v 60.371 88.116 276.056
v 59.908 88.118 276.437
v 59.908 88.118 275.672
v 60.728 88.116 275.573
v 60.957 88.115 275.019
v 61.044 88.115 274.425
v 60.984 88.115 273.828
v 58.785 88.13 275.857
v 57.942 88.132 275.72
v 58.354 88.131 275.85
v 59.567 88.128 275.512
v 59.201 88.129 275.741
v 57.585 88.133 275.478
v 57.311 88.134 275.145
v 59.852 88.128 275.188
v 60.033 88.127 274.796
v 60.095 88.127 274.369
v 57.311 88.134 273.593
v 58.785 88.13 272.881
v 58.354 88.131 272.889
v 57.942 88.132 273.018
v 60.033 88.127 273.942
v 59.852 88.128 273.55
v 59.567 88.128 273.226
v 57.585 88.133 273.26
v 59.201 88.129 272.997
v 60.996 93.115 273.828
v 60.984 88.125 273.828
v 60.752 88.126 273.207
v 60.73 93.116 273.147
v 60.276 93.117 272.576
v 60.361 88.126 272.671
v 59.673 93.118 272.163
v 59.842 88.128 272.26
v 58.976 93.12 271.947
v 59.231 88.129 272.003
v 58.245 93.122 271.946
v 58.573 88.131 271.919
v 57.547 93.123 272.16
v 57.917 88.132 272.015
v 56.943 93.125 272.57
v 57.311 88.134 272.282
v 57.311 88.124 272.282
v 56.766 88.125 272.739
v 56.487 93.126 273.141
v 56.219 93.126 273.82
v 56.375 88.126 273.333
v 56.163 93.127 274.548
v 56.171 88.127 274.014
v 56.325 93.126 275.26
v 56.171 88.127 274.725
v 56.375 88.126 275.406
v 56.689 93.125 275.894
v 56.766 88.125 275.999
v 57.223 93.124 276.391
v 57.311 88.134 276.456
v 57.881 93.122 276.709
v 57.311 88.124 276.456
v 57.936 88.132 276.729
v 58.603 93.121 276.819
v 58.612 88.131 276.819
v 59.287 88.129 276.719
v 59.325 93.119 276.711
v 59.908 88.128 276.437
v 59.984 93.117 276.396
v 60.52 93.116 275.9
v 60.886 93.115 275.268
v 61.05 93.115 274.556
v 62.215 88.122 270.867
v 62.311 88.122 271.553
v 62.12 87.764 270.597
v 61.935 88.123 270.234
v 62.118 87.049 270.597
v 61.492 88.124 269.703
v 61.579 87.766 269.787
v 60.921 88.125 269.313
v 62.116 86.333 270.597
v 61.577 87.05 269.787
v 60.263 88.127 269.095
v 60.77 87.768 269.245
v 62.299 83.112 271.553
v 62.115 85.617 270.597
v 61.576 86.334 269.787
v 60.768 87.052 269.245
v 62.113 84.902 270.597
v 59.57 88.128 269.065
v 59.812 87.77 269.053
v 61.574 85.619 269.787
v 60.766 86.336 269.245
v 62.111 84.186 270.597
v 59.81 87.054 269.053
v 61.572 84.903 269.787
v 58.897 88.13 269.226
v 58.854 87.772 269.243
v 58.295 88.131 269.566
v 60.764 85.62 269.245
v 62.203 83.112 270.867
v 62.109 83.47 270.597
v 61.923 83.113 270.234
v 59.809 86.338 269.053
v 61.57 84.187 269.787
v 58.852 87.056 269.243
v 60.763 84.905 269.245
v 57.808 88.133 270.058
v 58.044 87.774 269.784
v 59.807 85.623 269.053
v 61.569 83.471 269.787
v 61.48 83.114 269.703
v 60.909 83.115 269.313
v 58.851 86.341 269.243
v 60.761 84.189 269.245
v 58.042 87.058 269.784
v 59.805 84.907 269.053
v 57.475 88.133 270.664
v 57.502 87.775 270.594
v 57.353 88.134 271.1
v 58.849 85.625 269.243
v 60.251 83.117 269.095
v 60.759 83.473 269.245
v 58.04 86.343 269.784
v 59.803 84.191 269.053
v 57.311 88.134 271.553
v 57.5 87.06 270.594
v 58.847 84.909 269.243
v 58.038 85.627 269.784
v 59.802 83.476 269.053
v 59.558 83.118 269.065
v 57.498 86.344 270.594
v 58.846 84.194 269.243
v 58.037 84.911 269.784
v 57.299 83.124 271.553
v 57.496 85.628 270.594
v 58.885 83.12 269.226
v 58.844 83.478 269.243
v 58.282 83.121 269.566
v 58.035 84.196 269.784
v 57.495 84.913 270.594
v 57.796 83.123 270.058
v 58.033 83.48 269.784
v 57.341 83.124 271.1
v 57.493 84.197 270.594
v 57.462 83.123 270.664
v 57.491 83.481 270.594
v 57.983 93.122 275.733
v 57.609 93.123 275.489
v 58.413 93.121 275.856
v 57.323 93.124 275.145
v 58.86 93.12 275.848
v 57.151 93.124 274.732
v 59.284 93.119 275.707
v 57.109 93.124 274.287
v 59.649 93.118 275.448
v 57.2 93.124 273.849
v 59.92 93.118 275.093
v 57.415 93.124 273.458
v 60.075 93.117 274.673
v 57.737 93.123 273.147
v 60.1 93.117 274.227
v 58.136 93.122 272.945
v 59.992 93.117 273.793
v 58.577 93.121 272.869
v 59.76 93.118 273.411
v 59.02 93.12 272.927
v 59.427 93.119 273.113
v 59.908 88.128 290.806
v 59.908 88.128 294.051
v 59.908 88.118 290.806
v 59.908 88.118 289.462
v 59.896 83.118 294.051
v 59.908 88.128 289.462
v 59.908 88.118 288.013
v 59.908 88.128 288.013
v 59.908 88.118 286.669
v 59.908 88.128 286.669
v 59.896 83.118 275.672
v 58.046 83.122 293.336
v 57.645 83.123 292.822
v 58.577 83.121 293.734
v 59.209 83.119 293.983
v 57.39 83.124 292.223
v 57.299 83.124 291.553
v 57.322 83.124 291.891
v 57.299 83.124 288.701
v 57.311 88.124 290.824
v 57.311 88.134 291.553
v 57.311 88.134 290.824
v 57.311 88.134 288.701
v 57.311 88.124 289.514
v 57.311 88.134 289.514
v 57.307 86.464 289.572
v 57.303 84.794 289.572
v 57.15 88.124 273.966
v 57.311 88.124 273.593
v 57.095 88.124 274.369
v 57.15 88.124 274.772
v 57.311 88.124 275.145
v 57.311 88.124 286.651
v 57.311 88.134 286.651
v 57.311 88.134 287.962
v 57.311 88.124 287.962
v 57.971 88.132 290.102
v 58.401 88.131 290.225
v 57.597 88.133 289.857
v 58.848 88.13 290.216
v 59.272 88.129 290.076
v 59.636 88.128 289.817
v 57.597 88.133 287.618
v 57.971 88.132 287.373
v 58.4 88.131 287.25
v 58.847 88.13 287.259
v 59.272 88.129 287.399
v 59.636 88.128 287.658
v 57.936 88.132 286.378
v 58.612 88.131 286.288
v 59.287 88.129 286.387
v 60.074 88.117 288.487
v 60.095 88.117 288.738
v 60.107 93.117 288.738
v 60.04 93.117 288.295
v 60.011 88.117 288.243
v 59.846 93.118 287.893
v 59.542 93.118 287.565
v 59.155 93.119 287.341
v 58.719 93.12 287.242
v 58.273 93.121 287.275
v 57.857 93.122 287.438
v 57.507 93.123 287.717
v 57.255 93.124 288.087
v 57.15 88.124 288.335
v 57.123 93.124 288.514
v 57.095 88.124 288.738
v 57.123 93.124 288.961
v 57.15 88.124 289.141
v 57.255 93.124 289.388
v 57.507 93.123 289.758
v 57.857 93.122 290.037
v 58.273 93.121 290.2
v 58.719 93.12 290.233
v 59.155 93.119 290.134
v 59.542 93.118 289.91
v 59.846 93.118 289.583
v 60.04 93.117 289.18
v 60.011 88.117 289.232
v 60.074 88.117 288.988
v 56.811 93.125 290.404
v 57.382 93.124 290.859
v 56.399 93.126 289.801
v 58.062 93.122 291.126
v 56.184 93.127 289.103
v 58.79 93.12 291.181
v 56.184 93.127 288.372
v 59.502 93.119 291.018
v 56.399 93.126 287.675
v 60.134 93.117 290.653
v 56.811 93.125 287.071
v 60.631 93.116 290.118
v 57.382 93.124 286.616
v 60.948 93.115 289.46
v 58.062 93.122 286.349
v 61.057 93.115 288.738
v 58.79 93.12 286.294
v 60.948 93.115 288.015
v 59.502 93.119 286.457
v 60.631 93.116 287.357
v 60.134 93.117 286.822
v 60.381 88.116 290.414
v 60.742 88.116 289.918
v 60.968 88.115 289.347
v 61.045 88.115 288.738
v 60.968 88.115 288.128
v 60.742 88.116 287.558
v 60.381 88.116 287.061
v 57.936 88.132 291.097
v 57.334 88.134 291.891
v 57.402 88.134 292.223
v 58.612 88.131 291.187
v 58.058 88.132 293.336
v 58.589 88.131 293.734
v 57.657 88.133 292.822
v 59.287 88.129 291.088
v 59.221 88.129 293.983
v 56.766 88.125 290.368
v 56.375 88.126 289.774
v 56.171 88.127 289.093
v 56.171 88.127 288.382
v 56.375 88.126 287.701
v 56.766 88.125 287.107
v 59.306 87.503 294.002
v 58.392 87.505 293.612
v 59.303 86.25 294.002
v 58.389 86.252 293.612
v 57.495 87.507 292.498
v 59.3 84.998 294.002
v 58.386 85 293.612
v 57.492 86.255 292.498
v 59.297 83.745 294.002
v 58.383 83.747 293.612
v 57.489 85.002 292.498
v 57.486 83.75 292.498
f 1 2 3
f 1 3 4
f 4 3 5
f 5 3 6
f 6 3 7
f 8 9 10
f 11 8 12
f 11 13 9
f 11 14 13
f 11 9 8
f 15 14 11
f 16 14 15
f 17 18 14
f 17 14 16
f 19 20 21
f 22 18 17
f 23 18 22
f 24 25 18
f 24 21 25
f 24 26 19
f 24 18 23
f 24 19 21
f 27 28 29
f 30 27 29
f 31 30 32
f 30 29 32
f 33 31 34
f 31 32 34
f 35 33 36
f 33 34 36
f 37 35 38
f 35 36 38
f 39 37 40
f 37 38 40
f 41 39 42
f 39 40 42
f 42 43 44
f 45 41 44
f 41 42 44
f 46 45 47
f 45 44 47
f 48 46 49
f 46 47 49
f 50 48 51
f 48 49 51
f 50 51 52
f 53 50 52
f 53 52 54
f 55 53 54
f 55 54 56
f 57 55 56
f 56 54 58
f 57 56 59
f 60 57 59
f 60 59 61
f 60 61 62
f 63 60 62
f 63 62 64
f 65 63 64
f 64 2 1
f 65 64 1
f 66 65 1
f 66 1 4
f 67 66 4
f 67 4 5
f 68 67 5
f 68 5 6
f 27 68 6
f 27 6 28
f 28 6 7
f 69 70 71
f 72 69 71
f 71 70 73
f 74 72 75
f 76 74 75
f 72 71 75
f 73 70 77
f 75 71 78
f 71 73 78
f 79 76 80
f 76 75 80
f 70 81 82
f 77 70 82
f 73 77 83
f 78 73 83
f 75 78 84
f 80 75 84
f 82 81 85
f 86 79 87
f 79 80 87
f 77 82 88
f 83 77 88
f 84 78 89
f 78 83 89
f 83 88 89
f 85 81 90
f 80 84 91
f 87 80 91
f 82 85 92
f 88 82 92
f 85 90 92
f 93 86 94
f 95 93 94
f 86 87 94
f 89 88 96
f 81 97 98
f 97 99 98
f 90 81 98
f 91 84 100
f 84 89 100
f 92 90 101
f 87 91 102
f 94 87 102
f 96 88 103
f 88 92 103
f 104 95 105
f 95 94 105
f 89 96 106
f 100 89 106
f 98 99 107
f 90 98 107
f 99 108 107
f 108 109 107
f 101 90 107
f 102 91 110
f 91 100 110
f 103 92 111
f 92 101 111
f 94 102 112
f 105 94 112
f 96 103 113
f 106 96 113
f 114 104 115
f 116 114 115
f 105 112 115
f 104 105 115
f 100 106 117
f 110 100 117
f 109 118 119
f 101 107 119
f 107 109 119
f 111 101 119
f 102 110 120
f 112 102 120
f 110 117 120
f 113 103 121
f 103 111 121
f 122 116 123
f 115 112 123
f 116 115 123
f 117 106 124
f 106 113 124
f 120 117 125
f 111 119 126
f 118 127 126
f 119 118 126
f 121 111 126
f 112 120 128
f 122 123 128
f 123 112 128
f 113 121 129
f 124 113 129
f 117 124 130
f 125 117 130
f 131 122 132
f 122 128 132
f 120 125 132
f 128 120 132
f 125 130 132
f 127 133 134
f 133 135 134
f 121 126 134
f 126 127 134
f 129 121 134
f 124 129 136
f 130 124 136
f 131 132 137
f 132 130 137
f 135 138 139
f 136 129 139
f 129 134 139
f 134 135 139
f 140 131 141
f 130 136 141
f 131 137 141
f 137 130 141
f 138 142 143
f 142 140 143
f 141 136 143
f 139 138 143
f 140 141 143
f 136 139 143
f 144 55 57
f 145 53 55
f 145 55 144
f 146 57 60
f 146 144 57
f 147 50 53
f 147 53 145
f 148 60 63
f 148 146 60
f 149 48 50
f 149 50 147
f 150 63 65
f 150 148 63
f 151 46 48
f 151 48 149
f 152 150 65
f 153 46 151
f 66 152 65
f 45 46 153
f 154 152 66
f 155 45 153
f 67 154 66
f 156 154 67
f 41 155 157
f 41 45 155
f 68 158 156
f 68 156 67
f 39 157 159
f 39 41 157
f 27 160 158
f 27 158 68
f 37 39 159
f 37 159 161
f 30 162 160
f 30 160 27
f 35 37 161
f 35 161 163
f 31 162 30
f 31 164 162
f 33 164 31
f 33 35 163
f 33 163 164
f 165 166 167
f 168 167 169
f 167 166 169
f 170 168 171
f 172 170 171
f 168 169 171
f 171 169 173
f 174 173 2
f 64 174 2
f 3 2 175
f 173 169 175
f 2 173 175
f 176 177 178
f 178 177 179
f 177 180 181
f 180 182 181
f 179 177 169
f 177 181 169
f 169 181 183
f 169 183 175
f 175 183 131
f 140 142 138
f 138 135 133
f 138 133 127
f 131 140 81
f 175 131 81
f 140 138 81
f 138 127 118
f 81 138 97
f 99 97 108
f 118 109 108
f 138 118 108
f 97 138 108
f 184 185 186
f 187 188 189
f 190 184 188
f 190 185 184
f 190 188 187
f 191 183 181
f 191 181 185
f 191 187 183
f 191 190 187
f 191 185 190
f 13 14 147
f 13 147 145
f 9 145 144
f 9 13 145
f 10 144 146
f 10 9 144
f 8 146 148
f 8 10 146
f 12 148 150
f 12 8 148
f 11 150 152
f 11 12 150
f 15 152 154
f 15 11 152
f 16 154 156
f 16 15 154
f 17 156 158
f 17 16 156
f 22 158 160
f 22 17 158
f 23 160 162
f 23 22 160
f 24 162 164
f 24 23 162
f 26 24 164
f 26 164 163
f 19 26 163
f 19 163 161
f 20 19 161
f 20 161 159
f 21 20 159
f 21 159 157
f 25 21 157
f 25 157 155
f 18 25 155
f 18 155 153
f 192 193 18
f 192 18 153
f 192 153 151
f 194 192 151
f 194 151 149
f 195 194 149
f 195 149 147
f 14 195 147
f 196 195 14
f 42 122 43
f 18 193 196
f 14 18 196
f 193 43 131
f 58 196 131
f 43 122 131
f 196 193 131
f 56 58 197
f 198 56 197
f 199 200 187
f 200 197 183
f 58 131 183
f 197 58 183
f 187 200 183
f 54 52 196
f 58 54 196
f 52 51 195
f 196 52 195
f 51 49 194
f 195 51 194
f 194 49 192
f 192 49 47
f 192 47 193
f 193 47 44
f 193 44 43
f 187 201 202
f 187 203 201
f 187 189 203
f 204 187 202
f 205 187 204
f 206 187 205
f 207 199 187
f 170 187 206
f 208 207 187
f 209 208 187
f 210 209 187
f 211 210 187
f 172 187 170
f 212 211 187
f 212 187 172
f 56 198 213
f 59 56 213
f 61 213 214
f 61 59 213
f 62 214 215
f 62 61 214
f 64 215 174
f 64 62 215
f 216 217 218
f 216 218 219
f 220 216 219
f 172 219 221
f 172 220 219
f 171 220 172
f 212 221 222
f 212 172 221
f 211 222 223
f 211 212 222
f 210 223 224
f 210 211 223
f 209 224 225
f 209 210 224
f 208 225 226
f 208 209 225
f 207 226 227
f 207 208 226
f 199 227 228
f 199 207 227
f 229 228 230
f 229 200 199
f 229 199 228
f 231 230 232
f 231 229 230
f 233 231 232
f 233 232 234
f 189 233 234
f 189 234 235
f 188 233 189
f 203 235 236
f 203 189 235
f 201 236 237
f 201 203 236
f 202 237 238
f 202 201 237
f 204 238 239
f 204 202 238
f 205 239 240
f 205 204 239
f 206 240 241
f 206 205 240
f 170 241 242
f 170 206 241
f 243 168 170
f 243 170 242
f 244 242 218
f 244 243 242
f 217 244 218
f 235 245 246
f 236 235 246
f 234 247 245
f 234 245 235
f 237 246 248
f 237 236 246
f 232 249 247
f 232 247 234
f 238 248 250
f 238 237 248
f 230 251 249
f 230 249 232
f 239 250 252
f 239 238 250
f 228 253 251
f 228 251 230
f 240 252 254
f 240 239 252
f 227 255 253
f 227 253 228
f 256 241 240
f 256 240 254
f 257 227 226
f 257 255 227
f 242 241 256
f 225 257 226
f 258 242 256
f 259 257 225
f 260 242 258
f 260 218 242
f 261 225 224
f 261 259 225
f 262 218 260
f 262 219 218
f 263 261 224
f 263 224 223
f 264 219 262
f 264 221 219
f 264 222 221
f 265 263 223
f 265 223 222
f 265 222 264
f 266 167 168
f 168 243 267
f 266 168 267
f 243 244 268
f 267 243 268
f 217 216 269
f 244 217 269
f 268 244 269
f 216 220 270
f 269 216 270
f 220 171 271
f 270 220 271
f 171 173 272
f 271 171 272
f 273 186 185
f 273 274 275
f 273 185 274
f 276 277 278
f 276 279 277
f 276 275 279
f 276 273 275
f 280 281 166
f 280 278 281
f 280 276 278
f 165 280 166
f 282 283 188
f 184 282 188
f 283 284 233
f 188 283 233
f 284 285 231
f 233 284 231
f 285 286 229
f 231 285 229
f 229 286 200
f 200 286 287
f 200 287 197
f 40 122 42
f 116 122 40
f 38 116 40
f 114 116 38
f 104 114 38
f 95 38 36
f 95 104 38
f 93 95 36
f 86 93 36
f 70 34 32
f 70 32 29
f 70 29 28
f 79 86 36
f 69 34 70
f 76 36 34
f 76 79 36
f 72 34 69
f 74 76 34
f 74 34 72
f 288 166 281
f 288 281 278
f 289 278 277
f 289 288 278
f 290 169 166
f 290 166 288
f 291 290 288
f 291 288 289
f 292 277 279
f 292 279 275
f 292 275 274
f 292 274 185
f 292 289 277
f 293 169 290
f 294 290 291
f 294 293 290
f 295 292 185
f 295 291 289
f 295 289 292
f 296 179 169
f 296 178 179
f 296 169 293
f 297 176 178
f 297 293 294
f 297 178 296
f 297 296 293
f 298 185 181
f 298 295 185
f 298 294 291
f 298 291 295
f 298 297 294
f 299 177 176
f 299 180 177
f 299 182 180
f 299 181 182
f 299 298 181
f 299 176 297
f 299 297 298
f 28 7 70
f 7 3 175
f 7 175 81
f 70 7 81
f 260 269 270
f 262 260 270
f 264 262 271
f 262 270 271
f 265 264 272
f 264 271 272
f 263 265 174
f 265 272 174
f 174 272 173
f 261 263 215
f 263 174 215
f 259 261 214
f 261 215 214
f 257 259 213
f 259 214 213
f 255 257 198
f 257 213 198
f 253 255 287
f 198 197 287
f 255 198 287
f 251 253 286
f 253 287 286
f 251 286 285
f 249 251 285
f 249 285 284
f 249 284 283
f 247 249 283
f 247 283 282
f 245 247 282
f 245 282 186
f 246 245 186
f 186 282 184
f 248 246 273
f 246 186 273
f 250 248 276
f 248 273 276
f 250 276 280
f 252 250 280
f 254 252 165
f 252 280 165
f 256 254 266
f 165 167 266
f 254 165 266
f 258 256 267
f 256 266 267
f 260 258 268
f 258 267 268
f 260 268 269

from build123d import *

# Parameters (mm, degrees)
BOSS_EXTRUDE1_DEPTH      = 0.01
BOSS_EXTRUDE1_DEPTH_BACK = 5
SKETCH5_R                = 2.45
SKETCH5_R_2              = 1.5
BOSS_EXTRUDE2_DEPTH      = 5


with BuildPart() as part:
    # Sketch1 → Boss-Extrude1 (new, two sides: drawn at the far end of the back side and taken through both)
    with BuildSketch(Plane(origin=(0.212370974, 88.261171587, 0), x_dir=(0.9999971051966906, -0.0024061583985667905, 0), z_dir=(0.0024061583985667905, 0.9999971051966906, 2.2915916530952404e-15)).offset(-BOSS_EXTRUDE1_DEPTH_BACK)):
        with BuildLine():
            add(Edge.make_bspline(
                [(62.098697441, -271.553297735), (62.098697441, -271.390083561), (62.082868678, -271.227746225), (62.018744893, -270.904868209), (61.970774481, -270.747219765), (61.846181156, -270.44635233), (61.768554488, -270.300830702), (61.586127547, -270.027822449), (61.482834878, -269.902064788), (61.252588694, -269.671493322), (61.124154836, -269.565937636), (60.85291301, -269.384527638), (60.709509325, -269.307646832), (60.406882072, -269.181865969), (60.248191704, -269.13364771), (59.928627436, -269.06981324), (59.765989129, -269.053431748), (59.435435386, -269.053165346), (59.272896926, -269.069262853), (58.953071086, -269.132607362), (58.794102275, -269.180650645), (58.491413646, -269.30591032), (58.347818746, -269.382585434), (58.075961384, -269.563834415), (57.947444391, -269.669183663), (57.601723344, -270.014407111), (57.415265036, -270.29289619), (57.16528984, -270.894119026), (57.098697441, -271.222630203), (57.098697441, -271.553297735)],
                knots=[0, 0, 0, 0, 0.0625, 0.0625, 0.125, 0.125, 0.1875, 0.1875, 0.25, 0.25, 0.3125, 0.3125, 0.375, 0.375, 0.4375, 0.4375, 0.5, 0.5, 0.5625, 0.5625, 0.625, 0.625, 0.6875, 0.6875, 0.75, 0.75, 0.875, 0.875, 1, 1, 1, 1], degree=3))
            Line((57.098697441, -271.553297735), (57.098697441, -288.700730466))
            add(Edge.make_bspline(
                [(57.098697441, -291.553297735), (57.098716176, -291.500037735), (57.098733901, -291.446736965), (57.098944046, -290.775972975), (57.098997483, -290.169015827), (57.098876087, -289.279212217), (57.098803426, -288.988725401), (57.098697441, -288.700730466)],
                knots=[0.466050383, 0.466050383, 0.466050383, 0.466050383, 0.46875, 0.46875, 0.5, 0.5, 0.515336825, 0.515336825, 0.515336825, 0.515336825], degree=3))
            add(Edge.make_bspline(
                [(59.695767456, -294.051424481), (59.664952853, -294.052615647), (59.634064807, -294.053239292), (59.43288412, -294.053593818), (59.260500841, -294.036058258), (58.929915117, -293.968086951), (58.767684875, -293.9170646), (58.460210959, -293.785297782), (58.316149887, -293.70550705), (58.0458038, -293.51937365), (57.92043612, -293.413227178), (57.583512234, -293.067438733), (57.404616617, -292.79348169), (57.223603479, -292.349815403), (57.176716166, -292.193718571), (57.11440851, -291.876470519), (57.098697441, -291.715881831), (57.098697441, -291.553297735)],
                knots=[0.488631618, 0.488631618, 0.488631618, 0.488631618, 0.5, 0.5, 0.5625, 0.5625, 0.625, 0.625, 0.6875, 0.6875, 0.75, 0.75, 0.875, 0.875, 0.9375, 0.9375, 1, 1, 1, 1], degree=3))
            Line((59.695767456, -294.051424481), (59.695767456, -275.672418356))
            Line((59.695767456, -275.672418356), (62.098697441, -271.553297735))
        make_face()
    extrude(amount=BOSS_EXTRUDE1_DEPTH + BOSS_EXTRUDE1_DEPTH_BACK)

    # Sketch5 → Boss-Extrude2 (add)
    # profile 1 of 2: a face of its own
    with BuildSketch(Plane(origin=(0.212370974, 88.261171587, 0), x_dir=(0.9999971051966906, -0.0024061583985667905, 0), z_dir=(0.0024061583985667905, 0.9999971051966906, 2.2915916530952404e-15))):
        with Locations(Location((58.382444571, -274.369066811, 0), (0, 0, 12.765246623))):
            Circle(SKETCH5_R)
        with Locations(Location((58.382444571, -274.369066811, 0), (0, 0, 211.148291833))):
            Circle(SKETCH5_R_2, mode=Mode.SUBTRACT)
    # profile 2 of 2: a face of its own
    with BuildSketch(Plane(origin=(0.212370974, 88.261171587, 0), x_dir=(0.9999971051966906, -0.0024061583985667905, 0), z_dir=(0.0024061583985667905, 0.9999971051966906, 2.2915916530952404e-15))):
        with Locations((58.382444571, -288.73753777)):
            Circle(SKETCH5_R)
        with Locations((58.382444571, -288.73753777)):
            Circle(SKETCH5_R_2, mode=Mode.SUBTRACT)
    extrude(amount=BOSS_EXTRUDE2_DEPTH)


solid = part.part
